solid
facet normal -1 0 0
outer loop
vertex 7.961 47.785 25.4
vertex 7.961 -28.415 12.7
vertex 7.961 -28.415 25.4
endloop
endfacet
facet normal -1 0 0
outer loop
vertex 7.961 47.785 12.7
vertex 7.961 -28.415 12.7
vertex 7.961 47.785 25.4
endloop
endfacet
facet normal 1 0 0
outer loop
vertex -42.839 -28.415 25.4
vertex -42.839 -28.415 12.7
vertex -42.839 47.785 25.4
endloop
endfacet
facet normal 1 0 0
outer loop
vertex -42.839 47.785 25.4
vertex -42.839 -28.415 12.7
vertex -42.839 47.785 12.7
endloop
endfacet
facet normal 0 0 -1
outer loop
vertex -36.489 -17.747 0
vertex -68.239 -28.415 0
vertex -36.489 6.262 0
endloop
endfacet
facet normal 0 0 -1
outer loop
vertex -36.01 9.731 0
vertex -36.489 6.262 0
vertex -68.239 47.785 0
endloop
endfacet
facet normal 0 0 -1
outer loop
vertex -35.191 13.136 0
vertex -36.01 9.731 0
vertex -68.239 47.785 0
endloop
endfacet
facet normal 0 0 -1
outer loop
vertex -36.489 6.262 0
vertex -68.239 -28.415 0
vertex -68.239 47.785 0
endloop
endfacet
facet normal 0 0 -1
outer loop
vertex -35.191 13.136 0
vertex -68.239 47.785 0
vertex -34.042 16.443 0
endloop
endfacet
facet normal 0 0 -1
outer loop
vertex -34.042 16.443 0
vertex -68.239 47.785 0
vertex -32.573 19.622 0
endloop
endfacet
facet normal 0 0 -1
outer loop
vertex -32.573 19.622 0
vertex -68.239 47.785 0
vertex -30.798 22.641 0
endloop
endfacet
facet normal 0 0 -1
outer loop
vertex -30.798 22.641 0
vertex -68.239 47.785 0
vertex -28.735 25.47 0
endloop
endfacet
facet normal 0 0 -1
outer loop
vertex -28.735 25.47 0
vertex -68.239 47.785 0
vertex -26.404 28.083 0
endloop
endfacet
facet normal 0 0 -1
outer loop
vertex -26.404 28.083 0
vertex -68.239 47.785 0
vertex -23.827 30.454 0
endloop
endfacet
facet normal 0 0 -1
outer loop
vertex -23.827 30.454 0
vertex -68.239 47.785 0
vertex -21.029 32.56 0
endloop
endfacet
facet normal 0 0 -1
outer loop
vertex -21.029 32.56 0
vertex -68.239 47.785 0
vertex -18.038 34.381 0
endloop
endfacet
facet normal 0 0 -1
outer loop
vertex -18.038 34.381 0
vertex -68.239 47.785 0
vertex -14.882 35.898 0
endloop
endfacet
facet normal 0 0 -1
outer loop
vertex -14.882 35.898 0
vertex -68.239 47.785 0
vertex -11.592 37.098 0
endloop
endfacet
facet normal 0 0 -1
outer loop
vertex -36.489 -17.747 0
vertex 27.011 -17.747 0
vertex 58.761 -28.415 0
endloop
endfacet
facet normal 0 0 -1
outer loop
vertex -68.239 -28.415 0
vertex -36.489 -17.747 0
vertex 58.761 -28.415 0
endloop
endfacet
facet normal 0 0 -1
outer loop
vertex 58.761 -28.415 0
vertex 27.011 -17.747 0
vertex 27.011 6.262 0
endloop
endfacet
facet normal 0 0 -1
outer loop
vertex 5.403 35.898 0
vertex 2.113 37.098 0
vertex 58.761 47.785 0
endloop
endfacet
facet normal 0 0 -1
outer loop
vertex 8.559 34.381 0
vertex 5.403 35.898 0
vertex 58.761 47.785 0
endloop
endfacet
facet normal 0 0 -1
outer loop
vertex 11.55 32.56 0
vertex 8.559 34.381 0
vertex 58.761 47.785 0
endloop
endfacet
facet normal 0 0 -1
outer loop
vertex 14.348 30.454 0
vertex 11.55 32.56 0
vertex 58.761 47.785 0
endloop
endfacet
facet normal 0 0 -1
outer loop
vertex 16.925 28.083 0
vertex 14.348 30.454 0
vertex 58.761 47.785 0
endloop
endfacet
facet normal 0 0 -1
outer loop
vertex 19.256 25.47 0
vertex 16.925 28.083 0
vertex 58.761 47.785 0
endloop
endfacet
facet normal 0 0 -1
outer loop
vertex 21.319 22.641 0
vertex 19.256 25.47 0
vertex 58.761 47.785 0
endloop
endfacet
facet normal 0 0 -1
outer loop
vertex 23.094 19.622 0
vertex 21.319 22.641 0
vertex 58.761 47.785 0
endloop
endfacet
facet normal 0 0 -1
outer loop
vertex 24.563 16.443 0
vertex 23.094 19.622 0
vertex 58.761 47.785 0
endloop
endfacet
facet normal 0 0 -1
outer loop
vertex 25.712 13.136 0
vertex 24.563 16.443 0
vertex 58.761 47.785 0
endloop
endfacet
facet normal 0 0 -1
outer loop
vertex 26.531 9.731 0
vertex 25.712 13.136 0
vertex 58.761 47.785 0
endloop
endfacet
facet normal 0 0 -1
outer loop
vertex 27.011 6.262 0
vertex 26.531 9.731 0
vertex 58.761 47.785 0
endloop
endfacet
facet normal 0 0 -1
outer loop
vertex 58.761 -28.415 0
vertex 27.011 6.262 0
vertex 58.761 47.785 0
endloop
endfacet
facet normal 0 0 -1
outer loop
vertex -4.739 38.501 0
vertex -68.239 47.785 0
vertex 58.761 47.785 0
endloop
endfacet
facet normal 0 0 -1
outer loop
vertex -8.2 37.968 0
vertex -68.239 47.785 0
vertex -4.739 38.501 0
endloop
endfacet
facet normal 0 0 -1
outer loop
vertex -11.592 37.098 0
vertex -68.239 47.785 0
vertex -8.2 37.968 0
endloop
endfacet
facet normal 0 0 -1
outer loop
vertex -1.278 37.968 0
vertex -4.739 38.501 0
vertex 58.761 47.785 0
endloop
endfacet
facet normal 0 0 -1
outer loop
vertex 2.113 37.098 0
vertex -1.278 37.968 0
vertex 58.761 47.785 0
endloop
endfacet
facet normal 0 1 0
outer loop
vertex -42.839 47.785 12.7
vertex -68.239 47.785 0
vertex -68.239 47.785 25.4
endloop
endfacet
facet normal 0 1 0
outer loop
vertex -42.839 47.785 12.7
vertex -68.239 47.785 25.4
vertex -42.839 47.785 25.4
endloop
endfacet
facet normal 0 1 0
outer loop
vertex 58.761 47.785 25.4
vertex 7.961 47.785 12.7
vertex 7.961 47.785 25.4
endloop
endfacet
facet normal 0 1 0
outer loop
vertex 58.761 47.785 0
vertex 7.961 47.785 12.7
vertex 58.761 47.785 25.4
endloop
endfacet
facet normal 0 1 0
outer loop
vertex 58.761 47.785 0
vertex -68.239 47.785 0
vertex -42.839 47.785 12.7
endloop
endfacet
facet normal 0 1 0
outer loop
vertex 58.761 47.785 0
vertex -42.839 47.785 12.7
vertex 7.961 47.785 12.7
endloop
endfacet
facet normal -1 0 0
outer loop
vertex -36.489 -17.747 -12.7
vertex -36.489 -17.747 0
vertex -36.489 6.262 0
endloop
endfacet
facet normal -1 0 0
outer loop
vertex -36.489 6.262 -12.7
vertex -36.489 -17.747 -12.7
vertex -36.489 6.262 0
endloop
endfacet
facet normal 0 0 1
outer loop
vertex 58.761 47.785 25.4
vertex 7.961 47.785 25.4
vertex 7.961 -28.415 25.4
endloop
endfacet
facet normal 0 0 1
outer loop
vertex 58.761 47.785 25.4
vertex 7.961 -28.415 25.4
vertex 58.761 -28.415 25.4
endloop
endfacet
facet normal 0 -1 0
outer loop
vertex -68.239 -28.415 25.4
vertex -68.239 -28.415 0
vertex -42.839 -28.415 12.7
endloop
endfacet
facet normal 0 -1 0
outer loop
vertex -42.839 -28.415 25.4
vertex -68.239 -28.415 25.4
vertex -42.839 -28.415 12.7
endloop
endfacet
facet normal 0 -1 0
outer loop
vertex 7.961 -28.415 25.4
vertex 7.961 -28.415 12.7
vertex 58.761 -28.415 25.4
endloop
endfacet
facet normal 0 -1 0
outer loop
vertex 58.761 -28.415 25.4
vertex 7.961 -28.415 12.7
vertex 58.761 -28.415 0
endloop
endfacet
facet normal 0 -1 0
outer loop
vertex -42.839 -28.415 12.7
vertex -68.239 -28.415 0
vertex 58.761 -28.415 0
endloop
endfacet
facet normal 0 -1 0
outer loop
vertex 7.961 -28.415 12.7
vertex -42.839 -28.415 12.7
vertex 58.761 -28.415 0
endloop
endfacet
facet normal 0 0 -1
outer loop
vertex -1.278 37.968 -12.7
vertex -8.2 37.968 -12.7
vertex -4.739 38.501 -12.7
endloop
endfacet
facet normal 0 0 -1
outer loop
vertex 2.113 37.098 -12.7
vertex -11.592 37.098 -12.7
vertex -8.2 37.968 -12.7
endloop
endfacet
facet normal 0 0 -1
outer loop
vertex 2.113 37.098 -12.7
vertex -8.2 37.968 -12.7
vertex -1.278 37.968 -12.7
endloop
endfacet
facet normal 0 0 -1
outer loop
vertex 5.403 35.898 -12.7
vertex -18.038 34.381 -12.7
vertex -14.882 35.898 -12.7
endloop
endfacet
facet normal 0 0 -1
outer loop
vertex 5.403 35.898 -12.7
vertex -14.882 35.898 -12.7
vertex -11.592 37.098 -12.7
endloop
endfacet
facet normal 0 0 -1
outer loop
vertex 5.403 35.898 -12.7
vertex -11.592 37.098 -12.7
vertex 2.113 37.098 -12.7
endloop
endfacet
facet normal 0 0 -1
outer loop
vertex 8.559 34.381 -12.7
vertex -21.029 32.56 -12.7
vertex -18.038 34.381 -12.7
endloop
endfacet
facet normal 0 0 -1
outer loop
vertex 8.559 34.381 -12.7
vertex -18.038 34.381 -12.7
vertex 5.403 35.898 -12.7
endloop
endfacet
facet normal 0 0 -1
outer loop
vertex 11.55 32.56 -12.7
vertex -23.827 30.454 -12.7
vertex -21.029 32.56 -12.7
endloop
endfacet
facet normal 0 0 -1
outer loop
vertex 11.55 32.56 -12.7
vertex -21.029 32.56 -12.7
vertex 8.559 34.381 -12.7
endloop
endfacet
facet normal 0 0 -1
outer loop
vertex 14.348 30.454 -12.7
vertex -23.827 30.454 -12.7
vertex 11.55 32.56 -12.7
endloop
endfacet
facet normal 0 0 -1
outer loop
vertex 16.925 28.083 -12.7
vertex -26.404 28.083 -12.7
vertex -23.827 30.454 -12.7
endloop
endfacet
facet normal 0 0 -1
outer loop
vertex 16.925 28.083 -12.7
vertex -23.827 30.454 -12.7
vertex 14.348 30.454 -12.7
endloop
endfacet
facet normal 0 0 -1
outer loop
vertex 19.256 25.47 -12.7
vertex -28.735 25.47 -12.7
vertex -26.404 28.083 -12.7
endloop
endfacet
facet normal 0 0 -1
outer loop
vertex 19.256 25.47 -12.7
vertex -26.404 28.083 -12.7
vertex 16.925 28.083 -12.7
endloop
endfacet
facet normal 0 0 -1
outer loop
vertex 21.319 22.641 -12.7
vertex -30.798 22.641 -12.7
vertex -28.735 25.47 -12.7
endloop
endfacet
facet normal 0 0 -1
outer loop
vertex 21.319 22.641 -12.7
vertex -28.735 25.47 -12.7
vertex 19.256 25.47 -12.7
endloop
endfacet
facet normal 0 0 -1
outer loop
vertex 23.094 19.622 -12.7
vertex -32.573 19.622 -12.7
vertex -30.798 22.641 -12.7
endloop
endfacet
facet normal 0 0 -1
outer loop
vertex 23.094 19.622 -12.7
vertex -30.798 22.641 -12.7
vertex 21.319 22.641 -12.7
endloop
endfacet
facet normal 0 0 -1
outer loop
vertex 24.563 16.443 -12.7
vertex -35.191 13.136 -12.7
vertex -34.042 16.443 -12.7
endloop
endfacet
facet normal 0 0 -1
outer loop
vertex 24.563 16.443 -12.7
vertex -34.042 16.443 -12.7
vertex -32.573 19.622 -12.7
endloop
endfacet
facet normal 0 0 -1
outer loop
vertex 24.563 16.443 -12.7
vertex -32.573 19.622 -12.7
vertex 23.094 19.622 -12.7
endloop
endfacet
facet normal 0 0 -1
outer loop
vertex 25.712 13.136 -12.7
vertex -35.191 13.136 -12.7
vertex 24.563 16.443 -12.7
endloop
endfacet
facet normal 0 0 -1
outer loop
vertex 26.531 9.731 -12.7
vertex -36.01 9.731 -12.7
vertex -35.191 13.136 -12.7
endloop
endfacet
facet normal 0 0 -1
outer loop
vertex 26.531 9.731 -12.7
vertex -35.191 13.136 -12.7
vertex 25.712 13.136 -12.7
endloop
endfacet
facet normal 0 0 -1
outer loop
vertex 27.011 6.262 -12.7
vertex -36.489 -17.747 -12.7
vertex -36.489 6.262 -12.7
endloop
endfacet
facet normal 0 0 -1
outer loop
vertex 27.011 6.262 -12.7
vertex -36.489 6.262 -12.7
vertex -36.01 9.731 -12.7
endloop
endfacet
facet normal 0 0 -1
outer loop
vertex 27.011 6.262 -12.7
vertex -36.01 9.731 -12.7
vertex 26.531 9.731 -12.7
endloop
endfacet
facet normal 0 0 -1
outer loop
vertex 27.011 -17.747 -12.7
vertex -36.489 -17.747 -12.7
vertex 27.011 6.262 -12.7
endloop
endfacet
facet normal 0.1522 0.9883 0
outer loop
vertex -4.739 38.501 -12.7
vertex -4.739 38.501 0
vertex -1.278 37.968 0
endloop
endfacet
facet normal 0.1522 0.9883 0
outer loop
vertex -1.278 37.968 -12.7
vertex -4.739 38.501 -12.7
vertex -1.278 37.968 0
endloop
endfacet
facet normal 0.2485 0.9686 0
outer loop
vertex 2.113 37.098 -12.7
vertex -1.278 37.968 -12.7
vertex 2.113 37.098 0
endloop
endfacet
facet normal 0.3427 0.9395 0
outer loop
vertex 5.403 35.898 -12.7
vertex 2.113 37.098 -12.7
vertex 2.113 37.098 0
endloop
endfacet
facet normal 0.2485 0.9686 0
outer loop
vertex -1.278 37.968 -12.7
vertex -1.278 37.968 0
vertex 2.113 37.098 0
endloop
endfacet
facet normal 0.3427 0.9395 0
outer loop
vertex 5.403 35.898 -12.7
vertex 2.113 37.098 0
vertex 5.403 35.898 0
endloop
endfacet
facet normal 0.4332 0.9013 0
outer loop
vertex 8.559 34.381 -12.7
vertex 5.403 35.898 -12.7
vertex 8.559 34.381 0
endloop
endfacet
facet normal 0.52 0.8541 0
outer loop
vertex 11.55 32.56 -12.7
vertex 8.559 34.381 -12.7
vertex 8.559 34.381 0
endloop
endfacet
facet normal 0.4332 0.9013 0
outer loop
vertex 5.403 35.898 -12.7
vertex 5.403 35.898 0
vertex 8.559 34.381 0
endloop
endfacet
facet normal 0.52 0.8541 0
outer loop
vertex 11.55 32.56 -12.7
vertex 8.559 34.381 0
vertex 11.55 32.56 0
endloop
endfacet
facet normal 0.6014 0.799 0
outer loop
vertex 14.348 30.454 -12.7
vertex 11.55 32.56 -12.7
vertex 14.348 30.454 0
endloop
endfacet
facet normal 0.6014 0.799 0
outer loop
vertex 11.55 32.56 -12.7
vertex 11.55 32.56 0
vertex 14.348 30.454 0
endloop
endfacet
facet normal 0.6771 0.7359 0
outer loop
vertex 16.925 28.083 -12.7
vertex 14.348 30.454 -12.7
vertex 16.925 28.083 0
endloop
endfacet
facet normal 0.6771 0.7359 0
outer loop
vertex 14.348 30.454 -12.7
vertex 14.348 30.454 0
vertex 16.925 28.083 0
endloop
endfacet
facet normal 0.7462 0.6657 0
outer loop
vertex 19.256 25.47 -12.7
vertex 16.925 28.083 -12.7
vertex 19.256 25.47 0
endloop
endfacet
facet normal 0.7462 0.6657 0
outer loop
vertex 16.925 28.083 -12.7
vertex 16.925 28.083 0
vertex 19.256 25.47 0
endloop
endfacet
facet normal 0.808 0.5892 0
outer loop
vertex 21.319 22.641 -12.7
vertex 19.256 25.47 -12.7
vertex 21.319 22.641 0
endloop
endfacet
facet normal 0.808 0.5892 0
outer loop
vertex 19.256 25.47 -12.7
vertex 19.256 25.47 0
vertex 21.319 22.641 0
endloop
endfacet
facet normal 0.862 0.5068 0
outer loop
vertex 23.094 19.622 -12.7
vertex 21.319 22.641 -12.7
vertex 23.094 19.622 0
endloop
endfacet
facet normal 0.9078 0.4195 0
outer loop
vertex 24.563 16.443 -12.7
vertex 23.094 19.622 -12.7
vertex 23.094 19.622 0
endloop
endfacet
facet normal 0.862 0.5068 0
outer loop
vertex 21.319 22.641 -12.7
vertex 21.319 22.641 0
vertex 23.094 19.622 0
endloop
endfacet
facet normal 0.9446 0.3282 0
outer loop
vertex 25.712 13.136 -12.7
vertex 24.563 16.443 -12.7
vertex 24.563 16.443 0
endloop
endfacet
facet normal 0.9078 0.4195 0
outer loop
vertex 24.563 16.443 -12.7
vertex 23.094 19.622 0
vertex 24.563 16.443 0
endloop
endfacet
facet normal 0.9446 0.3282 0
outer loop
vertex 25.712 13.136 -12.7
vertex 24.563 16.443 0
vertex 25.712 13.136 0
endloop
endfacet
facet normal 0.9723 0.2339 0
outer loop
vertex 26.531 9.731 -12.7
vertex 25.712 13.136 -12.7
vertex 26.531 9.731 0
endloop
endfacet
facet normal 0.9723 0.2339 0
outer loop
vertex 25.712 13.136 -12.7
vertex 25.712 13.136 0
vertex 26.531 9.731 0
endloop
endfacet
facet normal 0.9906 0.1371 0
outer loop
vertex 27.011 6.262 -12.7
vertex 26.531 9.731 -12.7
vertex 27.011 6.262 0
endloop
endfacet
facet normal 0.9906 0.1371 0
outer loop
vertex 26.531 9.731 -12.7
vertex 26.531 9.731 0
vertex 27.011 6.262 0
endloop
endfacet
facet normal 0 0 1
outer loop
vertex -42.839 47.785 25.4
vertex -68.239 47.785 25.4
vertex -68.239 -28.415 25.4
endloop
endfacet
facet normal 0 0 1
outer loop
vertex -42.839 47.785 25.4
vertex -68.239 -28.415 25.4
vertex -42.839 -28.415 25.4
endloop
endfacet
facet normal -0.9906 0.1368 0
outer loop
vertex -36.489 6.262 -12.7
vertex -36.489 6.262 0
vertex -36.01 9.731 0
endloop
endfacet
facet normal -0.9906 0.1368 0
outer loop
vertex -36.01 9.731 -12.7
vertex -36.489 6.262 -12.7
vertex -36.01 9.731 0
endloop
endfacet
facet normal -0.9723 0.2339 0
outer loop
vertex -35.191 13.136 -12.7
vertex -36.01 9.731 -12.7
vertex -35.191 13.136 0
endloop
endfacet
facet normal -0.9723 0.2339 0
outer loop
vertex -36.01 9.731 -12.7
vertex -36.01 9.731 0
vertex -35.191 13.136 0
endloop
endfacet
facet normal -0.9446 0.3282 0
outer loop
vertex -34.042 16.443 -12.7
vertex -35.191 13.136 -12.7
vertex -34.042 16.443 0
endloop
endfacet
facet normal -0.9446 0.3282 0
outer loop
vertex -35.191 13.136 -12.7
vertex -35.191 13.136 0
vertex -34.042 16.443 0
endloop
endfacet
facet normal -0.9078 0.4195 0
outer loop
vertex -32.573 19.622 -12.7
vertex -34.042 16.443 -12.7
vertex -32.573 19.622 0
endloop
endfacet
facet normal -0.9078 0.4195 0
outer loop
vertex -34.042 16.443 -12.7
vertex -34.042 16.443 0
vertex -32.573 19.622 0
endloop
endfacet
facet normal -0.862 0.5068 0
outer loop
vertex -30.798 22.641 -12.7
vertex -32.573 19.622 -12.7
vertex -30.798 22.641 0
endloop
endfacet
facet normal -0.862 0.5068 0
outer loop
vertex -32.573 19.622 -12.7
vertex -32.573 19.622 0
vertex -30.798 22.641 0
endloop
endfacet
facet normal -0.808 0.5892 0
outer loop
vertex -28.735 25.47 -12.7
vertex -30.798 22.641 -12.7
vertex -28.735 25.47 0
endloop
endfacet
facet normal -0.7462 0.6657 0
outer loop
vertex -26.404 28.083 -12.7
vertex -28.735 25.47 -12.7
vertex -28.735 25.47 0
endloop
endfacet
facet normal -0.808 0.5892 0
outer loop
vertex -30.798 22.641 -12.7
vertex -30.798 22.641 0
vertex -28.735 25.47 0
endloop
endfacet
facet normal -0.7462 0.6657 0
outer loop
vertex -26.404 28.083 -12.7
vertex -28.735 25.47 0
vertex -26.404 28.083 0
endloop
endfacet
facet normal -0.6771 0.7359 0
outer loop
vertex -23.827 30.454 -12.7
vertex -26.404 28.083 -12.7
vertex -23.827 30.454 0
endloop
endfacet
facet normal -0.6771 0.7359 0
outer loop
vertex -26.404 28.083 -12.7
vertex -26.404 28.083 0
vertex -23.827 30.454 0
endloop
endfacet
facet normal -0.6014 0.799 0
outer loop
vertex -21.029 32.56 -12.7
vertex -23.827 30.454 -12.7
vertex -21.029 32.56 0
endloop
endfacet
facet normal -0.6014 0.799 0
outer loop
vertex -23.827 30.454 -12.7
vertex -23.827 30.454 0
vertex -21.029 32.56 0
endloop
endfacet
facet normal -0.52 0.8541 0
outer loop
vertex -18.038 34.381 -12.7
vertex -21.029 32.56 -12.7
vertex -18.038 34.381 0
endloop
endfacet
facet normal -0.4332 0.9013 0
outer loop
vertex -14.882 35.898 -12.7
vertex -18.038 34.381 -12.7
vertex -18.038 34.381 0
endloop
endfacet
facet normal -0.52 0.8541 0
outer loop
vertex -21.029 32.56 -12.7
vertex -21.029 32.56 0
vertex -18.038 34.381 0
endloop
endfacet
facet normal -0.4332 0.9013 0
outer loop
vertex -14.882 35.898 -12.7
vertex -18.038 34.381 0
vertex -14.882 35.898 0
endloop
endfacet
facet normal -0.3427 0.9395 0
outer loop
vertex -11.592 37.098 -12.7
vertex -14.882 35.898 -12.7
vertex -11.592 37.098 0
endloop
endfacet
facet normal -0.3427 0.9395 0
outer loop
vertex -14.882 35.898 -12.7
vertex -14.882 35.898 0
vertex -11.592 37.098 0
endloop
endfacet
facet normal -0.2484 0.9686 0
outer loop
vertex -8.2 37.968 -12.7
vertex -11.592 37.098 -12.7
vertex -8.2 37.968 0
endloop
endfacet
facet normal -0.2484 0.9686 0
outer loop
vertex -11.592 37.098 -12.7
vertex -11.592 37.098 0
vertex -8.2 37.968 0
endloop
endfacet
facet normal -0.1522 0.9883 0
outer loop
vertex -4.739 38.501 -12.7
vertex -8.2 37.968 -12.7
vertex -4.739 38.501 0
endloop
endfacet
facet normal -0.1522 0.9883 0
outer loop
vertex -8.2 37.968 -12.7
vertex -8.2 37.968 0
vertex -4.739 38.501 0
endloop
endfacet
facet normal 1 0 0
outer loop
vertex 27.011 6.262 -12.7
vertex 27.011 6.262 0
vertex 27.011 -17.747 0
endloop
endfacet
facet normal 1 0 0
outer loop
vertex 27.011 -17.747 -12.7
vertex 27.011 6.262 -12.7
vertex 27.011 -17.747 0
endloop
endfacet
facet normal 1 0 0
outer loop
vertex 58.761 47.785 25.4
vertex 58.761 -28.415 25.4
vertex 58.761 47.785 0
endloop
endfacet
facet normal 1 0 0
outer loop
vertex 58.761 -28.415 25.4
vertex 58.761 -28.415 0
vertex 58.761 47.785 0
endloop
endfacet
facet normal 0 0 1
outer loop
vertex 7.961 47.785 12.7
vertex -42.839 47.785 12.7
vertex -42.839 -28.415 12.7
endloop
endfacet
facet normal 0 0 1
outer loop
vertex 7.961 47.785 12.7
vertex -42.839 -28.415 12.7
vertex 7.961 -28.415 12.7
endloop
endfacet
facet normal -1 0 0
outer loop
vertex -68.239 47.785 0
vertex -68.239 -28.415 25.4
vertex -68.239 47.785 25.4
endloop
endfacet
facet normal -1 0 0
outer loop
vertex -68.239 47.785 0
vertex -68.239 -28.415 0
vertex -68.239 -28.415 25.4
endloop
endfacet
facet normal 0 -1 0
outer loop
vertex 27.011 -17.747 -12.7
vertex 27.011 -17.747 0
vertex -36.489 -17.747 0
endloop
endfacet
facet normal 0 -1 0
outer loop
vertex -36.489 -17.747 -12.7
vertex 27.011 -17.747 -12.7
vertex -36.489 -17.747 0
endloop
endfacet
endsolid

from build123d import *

# Parameters (mm, degrees)
F1_DEPTH = 12.7
F2_W     = 25.4
F2_H     = 76.2
F3_DEPTH = 12.7
F4_W     = 50.8
F4_H     = 76.2
F5_DEPTH = 12.7
F7_DEPTH = 12.7


with BuildPart() as f1:
    # F0 (on Top) → F1 (new body)
    with BuildSketch(Plane.XY):
        Polygon((-42.839443, 47.784637), (-68.239443, 47.784637), (-68.239443, -28.415363), (-42.839443, -28.415363), (7.960557, -28.415363), (58.760557, -28.415363), (58.760557, 47.784637), (7.960557, 47.784637), align=None)
    extrude(amount=F1_DEPTH)

    # F2 (on face) → F3 (join)
    with BuildSketch(Plane.XY.offset(12.7)):
        with Locations((-55.539443, 9.684637)):
            Rectangle(F2_W, F2_H)
    extrude(amount=F3_DEPTH)

    # F4 (on face) → F5 (join)
    with BuildSketch(Plane.XY.offset(12.7)):
        with Locations((33.360557, 9.684637)):
            Rectangle(F4_W, F4_H)
    extrude(amount=F5_DEPTH)

    # F6 (on face) → F7 (join)
    with BuildSketch(Plane(origin=(0, 0, 0), x_dir=(1, 0, 0), z_dir=(0, 0, -1))):
        with BuildLine():
            Line((27.010557, 17.746579), (-4.739443, 17.746579))
            Line((-4.739443, 17.746579), (-36.489443, 17.746579))
            Line((-36.489443, 17.746579), (-36.489443, 0))
            Line((-36.489443, 0), (-36.489443, -6.262278))
            ThreePointArc((-36.489443, -6.262278), (-26.403608, -28.083061), (-4.739443, -38.501054))
            ThreePointArc((-4.739443, -38.501054), (16.924722, -28.083061), (27.010557, -6.262278))
            Line((27.010557, -6.262278), (27.010557, 0))
            Line((27.010557, 0), (27.010557, 17.746579))
        make_face()
    extrude(amount=F7_DEPTH)


solid = f1.part
